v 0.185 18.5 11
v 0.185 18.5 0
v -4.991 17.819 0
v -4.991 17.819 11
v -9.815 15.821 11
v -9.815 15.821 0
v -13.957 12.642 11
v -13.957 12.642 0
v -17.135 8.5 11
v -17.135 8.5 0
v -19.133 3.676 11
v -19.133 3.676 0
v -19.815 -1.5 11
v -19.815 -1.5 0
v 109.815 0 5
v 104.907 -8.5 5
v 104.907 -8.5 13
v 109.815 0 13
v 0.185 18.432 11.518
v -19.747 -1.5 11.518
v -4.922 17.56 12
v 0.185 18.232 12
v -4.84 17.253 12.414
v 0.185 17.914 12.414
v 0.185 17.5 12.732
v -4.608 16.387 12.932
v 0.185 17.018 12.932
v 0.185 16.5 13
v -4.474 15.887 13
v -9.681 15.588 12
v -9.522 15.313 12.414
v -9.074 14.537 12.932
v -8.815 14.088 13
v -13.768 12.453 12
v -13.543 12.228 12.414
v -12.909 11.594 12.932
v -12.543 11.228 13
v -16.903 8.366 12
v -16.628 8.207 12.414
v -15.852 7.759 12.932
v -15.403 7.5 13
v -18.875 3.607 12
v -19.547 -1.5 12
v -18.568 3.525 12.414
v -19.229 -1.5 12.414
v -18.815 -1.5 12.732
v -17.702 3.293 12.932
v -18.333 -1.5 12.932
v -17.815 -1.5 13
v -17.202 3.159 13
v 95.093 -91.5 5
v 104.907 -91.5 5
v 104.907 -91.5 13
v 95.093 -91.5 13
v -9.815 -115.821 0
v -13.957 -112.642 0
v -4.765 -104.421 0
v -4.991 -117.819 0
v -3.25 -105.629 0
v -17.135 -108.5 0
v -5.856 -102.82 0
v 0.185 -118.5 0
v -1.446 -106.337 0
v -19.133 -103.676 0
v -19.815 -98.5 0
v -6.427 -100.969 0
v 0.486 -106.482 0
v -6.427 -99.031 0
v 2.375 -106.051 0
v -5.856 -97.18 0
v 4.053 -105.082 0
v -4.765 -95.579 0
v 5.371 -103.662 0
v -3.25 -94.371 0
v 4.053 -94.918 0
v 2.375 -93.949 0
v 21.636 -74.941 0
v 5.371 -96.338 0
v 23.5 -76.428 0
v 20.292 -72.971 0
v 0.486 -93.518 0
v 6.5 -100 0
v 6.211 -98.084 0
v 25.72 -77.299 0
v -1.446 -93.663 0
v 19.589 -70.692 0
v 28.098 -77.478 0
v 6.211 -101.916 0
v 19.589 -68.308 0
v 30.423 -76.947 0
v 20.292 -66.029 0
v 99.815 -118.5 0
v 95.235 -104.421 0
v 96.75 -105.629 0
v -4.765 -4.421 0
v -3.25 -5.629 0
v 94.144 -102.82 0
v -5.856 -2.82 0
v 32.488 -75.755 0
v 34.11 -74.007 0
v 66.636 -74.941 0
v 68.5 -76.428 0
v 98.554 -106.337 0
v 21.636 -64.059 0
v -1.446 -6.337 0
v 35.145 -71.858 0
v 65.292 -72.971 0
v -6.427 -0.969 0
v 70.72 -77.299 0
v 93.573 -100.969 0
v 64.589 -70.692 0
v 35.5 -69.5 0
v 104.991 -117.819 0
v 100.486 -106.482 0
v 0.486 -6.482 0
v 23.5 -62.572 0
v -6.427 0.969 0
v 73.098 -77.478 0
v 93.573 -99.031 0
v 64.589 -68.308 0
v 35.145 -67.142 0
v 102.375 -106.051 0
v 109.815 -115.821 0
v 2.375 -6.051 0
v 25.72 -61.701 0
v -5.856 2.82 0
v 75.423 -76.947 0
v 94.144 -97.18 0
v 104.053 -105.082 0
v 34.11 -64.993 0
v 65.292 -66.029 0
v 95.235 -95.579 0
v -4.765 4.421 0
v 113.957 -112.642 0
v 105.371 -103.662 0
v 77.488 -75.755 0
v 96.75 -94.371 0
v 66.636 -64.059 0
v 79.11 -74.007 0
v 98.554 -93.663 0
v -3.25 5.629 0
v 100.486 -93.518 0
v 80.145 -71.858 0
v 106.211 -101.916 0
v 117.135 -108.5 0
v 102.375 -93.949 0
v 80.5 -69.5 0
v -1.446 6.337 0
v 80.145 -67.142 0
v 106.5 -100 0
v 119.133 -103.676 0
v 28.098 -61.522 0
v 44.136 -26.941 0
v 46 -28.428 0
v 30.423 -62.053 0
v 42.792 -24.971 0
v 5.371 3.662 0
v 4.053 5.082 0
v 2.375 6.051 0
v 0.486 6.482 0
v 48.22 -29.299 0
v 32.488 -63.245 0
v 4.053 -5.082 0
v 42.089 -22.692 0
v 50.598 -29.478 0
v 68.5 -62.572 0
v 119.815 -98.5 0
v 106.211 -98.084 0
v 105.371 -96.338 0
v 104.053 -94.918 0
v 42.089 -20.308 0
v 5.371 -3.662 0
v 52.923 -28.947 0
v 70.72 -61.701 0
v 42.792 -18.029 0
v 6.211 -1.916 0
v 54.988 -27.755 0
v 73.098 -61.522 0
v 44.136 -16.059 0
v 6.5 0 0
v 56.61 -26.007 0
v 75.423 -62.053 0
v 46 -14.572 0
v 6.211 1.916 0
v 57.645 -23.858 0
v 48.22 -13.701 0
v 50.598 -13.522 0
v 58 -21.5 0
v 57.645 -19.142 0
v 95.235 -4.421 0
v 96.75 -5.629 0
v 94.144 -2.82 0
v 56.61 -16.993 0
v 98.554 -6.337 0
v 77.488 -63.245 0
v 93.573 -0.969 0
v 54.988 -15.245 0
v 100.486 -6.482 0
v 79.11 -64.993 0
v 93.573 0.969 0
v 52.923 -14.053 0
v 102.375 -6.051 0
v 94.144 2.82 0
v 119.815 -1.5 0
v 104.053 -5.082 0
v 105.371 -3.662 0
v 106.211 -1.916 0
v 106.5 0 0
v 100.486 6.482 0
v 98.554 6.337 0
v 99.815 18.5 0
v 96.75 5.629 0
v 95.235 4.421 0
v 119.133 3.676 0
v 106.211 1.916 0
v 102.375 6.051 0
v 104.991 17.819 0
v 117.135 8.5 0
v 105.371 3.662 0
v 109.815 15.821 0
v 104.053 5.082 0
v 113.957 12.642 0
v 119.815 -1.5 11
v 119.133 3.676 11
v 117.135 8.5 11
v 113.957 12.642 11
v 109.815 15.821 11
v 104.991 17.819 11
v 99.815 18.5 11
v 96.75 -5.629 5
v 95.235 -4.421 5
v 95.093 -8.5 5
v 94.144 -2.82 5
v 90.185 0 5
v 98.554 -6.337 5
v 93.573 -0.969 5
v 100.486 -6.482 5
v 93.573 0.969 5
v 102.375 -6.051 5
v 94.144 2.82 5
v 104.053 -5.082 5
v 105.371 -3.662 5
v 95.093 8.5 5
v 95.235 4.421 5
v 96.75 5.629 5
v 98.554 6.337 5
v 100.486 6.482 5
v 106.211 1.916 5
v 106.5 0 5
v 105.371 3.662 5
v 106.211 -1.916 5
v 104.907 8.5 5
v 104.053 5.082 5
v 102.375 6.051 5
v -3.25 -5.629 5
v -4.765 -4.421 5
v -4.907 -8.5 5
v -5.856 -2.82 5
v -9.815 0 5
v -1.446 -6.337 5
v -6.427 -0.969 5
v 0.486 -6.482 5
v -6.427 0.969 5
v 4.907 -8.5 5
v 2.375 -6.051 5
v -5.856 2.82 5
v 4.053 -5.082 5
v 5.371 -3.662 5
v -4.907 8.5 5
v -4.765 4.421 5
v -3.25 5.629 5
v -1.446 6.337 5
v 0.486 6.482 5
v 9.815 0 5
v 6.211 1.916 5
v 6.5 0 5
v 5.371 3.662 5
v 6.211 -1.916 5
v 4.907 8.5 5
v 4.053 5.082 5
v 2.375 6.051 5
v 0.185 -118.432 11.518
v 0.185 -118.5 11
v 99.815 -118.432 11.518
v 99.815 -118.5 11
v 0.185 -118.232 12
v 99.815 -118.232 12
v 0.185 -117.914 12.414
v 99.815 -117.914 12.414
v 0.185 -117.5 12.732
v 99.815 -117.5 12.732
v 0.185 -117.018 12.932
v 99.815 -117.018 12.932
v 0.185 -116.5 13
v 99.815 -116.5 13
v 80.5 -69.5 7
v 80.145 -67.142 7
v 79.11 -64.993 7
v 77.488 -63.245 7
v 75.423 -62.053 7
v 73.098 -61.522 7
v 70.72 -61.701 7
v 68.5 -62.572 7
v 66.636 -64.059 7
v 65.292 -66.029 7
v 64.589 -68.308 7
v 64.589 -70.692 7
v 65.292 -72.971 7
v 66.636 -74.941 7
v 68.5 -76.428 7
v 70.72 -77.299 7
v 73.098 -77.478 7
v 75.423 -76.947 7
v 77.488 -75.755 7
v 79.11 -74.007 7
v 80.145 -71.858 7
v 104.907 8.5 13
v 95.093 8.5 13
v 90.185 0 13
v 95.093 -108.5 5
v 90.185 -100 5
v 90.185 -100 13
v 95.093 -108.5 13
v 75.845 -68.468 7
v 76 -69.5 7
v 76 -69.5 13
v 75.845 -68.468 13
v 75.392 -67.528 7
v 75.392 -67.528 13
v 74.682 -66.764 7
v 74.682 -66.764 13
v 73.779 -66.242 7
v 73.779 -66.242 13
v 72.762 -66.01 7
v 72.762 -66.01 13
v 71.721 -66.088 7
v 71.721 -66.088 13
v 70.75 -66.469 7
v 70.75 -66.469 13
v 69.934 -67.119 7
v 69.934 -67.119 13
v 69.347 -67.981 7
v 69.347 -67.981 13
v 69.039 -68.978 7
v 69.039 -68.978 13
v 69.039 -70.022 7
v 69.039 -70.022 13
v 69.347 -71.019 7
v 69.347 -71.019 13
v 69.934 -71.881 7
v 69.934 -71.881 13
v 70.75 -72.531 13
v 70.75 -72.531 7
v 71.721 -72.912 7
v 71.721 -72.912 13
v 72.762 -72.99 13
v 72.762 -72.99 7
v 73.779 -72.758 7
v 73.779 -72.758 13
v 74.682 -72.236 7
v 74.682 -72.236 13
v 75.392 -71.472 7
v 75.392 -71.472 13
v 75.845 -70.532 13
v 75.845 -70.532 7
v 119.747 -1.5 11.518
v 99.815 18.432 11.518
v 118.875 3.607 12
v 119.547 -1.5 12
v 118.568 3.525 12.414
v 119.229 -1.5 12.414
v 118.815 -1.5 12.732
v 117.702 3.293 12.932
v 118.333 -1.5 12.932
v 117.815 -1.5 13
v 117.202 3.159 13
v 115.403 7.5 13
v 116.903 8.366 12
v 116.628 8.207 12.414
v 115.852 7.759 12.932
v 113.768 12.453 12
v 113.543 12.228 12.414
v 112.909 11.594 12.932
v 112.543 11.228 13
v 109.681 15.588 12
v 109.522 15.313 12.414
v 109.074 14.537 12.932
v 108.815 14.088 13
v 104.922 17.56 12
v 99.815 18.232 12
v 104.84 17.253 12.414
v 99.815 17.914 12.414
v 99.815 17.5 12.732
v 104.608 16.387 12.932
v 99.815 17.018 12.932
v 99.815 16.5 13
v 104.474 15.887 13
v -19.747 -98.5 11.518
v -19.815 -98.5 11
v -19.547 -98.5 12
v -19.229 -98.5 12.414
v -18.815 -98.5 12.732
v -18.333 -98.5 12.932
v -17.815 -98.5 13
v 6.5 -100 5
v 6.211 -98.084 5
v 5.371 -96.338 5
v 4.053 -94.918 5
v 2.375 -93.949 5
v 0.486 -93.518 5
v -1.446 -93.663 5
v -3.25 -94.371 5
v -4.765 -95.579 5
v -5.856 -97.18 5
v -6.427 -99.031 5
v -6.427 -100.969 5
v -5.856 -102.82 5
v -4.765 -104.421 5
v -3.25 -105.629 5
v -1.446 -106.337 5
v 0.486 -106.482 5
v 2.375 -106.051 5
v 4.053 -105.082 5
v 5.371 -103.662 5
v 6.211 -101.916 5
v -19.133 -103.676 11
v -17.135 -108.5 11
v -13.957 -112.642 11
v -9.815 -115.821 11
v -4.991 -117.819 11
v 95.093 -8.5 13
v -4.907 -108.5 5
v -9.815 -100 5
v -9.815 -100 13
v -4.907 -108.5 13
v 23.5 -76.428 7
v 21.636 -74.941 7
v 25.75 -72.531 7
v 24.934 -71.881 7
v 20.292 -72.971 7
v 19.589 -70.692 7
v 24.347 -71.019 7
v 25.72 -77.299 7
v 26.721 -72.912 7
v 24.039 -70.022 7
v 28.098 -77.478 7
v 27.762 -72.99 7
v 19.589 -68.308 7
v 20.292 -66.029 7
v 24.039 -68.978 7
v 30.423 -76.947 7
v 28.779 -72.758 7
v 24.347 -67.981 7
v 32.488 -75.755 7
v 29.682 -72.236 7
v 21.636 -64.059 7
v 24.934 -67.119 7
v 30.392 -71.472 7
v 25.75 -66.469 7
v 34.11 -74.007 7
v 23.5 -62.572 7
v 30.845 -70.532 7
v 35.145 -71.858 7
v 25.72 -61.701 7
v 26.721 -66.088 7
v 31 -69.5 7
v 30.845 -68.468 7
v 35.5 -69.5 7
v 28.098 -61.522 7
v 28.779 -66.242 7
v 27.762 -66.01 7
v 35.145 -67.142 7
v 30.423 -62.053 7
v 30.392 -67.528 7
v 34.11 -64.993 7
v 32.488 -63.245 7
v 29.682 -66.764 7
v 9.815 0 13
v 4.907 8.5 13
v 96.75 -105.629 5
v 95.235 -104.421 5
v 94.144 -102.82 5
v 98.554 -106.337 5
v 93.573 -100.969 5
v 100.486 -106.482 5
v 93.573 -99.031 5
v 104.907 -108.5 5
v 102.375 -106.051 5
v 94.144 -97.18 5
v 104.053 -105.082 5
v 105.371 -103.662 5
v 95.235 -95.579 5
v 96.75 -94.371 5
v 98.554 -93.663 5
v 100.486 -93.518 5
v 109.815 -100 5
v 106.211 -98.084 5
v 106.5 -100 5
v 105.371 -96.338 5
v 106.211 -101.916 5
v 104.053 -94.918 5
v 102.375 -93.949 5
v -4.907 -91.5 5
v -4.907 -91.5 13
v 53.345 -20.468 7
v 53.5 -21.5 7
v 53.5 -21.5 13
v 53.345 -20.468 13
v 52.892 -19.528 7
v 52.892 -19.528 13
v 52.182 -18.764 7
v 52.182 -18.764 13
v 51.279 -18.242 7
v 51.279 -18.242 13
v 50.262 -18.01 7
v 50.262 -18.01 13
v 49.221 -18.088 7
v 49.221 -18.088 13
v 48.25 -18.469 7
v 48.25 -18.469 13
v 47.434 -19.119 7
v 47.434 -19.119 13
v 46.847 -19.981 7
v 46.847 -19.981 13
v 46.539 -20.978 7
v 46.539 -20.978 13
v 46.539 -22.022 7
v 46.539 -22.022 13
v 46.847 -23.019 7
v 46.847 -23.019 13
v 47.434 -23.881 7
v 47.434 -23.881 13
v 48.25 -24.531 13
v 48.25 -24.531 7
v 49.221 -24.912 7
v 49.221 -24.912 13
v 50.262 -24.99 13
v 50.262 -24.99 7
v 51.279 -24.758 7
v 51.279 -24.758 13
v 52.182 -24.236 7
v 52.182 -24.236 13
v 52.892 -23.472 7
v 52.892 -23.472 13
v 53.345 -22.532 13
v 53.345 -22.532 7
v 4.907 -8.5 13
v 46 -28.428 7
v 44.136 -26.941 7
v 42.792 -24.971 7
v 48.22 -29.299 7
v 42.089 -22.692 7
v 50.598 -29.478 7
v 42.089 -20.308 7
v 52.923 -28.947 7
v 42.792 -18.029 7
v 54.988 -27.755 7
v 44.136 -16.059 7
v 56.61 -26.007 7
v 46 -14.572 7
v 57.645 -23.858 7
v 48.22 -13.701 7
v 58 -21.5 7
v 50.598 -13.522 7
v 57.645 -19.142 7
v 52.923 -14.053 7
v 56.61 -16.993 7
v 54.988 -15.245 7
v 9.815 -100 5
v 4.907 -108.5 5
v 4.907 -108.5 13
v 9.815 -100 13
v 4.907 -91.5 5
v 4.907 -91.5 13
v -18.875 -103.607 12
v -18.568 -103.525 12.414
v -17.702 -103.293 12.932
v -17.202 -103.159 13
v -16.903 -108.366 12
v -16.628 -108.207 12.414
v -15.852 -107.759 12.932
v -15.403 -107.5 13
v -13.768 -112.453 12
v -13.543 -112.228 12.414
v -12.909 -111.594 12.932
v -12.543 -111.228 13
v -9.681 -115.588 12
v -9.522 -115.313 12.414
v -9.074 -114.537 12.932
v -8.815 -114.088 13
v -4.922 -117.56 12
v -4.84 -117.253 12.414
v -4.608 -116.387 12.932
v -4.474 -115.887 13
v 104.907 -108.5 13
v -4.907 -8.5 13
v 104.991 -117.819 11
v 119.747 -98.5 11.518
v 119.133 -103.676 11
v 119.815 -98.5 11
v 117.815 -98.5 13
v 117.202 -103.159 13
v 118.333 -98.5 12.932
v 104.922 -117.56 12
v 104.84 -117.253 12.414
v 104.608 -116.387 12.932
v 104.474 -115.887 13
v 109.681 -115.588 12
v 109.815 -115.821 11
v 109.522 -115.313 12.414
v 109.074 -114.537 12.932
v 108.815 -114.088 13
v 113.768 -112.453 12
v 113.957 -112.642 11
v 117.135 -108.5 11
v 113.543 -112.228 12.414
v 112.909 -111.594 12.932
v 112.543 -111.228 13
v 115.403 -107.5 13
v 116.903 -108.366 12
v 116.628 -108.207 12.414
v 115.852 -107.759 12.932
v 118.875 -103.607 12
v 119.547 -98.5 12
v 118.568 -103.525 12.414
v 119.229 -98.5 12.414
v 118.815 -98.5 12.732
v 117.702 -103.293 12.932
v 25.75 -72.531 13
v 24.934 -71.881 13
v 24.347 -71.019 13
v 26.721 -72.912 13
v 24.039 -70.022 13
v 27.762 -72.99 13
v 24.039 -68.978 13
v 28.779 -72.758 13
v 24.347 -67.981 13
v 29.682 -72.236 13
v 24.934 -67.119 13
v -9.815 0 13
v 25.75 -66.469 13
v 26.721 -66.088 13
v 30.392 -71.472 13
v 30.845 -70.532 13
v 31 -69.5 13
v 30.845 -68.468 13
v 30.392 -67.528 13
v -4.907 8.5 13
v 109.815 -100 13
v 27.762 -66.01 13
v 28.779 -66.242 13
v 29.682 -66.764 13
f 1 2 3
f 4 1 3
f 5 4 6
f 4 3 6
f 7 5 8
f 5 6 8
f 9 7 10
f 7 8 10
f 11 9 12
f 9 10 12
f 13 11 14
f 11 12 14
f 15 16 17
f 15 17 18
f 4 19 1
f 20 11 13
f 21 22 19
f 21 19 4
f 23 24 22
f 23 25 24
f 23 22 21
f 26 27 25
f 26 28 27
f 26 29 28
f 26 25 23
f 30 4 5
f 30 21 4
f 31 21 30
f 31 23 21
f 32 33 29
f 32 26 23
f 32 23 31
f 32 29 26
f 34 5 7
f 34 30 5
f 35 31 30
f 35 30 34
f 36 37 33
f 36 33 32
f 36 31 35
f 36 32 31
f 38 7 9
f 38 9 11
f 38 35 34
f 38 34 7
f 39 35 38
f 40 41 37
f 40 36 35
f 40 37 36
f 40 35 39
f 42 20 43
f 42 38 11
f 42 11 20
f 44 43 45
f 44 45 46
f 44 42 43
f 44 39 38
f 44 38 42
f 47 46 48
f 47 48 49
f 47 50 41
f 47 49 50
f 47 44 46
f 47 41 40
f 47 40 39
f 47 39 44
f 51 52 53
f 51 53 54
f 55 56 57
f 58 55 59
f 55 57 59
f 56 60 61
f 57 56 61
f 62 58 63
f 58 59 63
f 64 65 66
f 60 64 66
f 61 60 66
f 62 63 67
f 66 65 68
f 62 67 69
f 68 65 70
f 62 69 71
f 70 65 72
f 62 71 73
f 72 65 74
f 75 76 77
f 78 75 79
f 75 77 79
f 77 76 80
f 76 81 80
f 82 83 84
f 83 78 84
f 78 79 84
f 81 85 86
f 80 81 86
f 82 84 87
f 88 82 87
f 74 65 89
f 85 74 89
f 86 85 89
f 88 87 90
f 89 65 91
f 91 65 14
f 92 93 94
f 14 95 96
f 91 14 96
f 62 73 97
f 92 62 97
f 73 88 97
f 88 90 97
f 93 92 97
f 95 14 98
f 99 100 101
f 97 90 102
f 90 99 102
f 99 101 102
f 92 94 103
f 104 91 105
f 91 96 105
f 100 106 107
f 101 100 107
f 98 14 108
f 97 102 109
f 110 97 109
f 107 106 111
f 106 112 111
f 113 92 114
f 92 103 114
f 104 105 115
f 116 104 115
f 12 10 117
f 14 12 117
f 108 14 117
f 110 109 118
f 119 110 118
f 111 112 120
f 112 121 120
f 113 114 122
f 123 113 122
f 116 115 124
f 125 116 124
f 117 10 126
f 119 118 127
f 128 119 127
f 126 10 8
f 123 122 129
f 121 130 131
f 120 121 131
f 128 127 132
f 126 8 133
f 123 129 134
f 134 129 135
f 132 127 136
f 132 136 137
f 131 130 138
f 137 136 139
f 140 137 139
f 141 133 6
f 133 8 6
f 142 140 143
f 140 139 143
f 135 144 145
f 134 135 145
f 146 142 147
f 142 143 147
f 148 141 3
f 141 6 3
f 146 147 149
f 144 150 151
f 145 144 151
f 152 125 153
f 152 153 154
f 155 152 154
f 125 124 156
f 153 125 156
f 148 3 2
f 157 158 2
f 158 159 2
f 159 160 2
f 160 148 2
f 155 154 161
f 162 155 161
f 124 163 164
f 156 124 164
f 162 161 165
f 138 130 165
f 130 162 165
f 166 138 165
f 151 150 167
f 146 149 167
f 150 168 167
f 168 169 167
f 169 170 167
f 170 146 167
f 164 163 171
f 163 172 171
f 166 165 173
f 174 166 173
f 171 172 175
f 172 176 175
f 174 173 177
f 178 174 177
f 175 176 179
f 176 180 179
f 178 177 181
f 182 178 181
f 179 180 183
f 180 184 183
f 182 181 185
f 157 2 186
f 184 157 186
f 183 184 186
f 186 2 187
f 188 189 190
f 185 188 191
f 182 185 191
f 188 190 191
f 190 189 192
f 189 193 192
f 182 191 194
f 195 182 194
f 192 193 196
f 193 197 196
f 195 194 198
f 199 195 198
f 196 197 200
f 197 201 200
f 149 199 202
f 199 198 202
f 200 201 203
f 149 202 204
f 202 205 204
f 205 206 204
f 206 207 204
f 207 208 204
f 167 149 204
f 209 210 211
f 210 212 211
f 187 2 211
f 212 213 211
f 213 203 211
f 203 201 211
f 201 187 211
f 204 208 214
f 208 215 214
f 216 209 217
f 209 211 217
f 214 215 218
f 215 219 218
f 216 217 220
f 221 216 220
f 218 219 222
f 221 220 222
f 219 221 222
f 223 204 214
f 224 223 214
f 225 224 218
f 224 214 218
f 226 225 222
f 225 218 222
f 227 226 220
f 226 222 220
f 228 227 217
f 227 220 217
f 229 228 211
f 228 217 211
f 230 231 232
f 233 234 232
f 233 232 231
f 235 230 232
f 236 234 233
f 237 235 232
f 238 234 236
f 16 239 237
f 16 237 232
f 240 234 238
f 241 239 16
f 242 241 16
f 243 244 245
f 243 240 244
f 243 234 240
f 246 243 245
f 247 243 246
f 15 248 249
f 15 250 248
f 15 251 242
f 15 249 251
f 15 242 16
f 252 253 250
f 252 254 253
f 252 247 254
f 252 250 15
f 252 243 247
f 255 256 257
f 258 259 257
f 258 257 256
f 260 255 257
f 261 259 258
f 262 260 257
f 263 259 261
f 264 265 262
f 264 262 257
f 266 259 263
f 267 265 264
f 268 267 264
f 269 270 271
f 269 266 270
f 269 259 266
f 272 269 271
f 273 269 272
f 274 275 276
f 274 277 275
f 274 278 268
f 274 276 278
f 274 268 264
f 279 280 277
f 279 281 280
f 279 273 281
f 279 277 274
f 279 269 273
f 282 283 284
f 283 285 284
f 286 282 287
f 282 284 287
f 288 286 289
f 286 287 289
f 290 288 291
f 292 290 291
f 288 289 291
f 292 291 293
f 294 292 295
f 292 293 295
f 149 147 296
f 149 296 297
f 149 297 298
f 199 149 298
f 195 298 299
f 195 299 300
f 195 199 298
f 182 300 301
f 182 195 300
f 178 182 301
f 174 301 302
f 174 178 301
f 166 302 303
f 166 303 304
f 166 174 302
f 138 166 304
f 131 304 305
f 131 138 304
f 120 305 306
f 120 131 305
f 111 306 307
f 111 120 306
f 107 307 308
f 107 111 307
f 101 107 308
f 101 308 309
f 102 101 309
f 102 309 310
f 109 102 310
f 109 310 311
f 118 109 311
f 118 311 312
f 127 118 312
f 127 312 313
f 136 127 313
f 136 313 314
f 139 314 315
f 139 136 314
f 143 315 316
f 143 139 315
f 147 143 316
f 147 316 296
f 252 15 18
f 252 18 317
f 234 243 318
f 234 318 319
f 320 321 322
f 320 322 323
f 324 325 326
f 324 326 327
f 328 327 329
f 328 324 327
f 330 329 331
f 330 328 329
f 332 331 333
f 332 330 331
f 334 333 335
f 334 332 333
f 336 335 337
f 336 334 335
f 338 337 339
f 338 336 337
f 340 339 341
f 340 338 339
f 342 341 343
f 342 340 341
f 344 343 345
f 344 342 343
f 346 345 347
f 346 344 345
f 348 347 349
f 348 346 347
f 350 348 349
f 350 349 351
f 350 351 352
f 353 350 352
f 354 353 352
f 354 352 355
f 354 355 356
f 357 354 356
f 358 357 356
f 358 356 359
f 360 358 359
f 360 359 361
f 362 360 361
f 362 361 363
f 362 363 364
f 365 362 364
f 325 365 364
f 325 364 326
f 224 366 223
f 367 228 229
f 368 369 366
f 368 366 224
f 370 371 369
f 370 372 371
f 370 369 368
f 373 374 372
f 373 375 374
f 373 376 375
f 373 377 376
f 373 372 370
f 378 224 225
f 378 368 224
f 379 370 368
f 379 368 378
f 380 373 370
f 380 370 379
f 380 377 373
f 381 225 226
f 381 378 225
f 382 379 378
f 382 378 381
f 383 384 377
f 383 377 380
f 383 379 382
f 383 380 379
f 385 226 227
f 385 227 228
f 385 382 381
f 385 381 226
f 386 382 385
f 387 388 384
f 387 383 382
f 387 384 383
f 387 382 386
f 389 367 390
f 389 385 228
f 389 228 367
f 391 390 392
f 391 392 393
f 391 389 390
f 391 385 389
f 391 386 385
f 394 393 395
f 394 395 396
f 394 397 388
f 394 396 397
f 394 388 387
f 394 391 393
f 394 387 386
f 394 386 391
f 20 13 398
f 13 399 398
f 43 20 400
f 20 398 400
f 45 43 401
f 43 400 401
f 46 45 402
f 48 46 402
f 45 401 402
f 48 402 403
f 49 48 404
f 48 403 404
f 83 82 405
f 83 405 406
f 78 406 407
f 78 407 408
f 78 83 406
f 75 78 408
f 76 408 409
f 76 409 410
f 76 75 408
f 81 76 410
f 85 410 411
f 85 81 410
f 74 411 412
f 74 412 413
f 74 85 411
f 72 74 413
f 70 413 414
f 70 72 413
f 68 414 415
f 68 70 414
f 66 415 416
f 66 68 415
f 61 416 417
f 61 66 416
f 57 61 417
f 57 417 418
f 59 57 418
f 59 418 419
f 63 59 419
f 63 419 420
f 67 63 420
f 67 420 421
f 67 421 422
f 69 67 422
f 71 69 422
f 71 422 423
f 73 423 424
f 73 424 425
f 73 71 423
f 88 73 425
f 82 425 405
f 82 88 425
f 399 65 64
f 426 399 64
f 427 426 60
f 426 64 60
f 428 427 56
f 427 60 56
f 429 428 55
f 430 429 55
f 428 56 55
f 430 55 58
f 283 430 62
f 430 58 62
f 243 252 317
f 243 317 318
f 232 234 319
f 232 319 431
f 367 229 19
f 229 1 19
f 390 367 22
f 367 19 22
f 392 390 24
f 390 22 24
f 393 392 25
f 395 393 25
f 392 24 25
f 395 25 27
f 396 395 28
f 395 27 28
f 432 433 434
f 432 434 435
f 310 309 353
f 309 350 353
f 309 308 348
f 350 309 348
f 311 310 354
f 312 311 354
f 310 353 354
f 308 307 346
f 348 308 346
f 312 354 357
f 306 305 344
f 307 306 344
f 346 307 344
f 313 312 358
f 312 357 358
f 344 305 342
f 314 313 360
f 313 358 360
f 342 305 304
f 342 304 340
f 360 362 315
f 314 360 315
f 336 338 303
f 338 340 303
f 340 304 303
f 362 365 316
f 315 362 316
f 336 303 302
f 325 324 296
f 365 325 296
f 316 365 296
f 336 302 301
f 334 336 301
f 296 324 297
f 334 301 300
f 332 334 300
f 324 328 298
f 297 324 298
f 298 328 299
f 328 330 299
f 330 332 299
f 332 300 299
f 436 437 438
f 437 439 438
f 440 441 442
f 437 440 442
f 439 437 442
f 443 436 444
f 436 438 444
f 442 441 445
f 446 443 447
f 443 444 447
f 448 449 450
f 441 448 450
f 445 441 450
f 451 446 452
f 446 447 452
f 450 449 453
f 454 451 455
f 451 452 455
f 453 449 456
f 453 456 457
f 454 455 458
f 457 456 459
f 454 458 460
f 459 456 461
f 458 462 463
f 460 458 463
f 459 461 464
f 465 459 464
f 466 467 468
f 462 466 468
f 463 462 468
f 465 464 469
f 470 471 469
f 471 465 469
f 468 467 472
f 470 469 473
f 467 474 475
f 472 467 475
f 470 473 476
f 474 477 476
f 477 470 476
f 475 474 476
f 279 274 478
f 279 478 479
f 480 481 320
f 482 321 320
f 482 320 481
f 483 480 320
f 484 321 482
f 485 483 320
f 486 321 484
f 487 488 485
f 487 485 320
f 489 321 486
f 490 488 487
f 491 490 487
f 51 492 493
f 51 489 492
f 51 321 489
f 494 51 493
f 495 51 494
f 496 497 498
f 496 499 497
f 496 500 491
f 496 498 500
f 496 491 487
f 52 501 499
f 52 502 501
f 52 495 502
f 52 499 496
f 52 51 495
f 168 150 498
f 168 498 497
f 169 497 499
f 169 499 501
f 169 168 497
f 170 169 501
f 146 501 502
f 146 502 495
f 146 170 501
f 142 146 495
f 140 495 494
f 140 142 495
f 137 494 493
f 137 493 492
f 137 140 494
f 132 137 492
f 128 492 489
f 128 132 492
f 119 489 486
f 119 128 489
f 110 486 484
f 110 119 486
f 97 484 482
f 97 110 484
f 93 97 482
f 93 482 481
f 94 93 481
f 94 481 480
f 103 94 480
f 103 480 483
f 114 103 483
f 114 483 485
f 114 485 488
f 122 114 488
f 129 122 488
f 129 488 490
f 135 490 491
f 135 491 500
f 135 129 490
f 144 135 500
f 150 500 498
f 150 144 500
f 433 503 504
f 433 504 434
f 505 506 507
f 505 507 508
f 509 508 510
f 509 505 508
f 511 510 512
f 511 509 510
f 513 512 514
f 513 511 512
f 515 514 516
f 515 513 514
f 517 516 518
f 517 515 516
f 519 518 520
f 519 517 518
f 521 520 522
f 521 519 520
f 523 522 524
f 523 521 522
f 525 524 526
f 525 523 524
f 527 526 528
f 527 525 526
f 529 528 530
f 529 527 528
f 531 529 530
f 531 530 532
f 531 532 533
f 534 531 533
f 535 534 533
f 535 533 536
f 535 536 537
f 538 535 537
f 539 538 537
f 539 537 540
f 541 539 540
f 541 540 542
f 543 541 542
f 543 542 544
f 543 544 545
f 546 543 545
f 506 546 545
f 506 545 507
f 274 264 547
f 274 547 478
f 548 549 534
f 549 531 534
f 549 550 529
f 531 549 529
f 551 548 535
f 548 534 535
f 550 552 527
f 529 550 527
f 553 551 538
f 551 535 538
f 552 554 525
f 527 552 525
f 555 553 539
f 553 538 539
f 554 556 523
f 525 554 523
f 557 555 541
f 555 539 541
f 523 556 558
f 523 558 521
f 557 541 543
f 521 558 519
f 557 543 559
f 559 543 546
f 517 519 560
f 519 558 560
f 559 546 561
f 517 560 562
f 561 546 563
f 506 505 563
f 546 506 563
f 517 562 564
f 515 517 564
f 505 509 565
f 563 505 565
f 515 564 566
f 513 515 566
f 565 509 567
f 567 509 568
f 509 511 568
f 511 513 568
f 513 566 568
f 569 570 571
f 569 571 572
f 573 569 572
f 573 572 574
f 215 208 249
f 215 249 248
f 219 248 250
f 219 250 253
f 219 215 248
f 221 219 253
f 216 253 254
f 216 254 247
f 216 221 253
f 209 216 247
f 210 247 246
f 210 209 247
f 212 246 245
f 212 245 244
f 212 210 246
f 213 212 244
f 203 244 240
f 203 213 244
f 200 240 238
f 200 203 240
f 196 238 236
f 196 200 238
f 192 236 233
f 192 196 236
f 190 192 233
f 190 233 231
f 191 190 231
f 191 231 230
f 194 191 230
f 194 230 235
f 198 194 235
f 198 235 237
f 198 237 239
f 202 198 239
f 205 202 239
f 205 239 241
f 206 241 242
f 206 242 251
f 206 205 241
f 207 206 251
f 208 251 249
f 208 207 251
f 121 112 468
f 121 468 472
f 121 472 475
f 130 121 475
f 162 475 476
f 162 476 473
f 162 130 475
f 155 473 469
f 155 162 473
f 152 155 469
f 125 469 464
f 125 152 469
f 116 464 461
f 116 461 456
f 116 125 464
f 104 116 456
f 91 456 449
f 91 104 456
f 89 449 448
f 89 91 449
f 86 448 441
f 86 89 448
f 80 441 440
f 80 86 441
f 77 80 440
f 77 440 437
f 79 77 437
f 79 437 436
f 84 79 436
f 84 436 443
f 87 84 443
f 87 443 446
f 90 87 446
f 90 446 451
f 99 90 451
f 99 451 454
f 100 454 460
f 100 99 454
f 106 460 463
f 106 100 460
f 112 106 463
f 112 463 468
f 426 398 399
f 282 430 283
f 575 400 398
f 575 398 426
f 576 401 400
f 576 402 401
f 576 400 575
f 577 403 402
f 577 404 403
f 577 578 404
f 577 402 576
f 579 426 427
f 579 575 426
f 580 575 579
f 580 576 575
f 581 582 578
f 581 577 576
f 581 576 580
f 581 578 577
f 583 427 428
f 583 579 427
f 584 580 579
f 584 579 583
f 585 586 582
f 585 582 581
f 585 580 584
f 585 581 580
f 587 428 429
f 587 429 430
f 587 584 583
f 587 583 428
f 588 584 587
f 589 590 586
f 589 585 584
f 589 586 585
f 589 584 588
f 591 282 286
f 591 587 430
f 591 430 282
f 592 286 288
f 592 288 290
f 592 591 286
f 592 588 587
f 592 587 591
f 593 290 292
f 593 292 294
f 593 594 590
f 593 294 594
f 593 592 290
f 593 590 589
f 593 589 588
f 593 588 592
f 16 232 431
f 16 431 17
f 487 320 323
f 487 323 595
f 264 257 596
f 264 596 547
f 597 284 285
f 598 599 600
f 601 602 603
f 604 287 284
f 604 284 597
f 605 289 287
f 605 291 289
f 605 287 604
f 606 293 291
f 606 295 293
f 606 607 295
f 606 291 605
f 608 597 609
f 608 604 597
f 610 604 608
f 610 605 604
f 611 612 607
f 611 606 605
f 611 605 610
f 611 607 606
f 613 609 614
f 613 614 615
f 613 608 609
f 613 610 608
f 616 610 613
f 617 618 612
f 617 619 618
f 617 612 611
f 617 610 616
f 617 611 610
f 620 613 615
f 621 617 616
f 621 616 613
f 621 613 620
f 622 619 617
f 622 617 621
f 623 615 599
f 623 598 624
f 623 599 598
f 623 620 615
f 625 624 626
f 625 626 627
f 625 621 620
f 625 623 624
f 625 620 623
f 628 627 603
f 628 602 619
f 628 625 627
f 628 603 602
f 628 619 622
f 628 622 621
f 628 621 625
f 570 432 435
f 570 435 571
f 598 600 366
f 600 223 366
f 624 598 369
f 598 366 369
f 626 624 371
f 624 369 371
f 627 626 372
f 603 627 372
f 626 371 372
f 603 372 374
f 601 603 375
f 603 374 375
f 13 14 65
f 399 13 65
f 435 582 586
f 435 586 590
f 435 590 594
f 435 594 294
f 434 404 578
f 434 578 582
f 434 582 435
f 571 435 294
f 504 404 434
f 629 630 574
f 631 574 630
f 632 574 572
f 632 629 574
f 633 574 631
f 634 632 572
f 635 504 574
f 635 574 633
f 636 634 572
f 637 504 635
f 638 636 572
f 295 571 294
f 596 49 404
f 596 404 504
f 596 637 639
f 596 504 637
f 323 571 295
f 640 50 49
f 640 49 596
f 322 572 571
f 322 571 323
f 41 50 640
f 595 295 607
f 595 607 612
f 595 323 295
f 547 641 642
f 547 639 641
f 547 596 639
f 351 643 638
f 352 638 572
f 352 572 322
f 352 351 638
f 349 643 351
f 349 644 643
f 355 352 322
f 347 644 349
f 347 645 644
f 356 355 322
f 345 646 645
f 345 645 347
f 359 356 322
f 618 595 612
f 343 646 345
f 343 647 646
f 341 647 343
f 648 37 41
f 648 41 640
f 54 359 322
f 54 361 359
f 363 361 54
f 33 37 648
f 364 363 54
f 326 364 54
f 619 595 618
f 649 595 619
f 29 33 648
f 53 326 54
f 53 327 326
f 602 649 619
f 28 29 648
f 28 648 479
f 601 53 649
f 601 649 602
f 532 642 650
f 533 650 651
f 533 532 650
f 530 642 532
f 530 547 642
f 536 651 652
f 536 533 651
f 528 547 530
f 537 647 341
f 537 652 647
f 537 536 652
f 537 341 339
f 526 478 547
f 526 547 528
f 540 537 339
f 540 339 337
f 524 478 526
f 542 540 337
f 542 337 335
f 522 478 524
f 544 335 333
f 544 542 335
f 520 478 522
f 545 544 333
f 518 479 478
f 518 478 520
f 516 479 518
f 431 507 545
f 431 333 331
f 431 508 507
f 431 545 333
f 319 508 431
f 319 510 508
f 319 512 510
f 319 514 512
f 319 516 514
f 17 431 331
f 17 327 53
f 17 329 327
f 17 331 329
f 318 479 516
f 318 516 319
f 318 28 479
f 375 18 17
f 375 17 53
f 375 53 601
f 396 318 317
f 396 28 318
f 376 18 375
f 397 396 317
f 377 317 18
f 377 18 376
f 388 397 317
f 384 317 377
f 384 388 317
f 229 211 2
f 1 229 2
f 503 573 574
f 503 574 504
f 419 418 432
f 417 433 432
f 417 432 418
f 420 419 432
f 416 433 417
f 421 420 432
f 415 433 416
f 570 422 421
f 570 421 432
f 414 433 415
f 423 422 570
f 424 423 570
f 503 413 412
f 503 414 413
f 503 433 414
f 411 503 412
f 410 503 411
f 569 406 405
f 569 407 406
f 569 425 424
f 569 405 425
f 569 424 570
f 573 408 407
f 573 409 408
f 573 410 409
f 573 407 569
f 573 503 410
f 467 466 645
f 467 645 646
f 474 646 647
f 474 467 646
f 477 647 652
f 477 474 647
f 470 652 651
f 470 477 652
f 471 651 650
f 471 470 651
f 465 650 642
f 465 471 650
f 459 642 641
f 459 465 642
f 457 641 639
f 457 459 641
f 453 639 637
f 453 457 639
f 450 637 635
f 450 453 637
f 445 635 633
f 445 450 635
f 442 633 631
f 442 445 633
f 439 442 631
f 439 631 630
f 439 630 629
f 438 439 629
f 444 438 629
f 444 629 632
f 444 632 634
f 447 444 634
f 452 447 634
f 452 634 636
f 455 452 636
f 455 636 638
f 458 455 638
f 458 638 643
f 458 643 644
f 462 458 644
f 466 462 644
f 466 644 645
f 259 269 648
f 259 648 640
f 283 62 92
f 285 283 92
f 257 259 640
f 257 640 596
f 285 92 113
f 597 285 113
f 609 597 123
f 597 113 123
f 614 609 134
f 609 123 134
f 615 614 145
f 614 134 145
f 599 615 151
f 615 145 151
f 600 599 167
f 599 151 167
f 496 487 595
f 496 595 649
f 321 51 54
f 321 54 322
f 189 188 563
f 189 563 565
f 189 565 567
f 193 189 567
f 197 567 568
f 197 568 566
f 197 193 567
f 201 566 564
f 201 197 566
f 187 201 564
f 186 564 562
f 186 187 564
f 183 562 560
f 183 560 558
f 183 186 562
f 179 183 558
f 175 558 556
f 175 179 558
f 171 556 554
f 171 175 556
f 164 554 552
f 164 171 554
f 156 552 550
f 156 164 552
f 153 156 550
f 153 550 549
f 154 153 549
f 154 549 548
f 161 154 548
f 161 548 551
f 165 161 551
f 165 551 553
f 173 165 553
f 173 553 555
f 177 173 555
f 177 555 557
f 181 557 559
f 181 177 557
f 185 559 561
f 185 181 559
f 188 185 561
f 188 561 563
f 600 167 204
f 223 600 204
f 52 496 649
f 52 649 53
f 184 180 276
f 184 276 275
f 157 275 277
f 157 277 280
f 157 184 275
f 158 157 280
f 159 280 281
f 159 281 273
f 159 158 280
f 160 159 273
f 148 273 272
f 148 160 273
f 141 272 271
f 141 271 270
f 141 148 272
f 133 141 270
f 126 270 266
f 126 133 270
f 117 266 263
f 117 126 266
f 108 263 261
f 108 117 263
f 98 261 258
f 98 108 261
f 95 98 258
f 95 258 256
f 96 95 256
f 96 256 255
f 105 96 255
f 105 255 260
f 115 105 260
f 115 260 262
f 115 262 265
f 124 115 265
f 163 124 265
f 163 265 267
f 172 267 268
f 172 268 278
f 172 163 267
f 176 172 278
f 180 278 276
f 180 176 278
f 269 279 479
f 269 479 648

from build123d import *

# Parameters (mm, degrees)
F0_R     = 8
F0_R_2   = 6.5
F0_R_3   = 3.5
F1_DEPTH = 13
F2_DEPTH = 13
F3_DEPTH = 7
F4_DEPTH = 13
F5_DEPTH = 5
F6_DEPTH = 5
F7_R     = 2


with BuildPart() as f1:
    # F0 (on Top) → F1 (new body)
    with BuildSketch(Plane.XY):
        with BuildLine():
            Line((99.814955, 18.5), (0.185045, 18.5))
            ThreePointArc((0.185045, 18.5), (-13.95709, 12.642136), (-19.814955, -1.5))
            Line((-19.814955, -1.5), (-19.814955, -98.5))
            ThreePointArc((-19.814955, -98.5), (-13.95709, -112.642136), (0.185045, -118.5))
            Line((0.185045, -118.5), (99.814955, -118.5))
            ThreePointArc((99.814955, -118.5), (113.95709, -112.642136), (119.814955, -98.5))
            Line((119.814955, -98.5), (119.814955, -1.5))
            ThreePointArc((119.814955, -1.5), (113.95709, 12.642136), (99.814955, 18.5))
        make_face()
        Polygon((9.814955, -100), (4.907477, -108.5), (-4.907477, -108.5), (-9.814955, -100), (-4.907477, -91.5), (4.907477, -91.5), align=None, mode=Mode.SUBTRACT)
        with Locations((27.5, -69.5)):
            Circle(F0_R, mode=Mode.SUBTRACT)
        Polygon((109.814955, -100), (104.907477, -108.5), (95.092523, -108.5), (90.185045, -100), (95.092523, -91.5), (104.907477, -91.5), align=None, mode=Mode.SUBTRACT)
        with Locations((72.5, -69.5)):
            Circle(F0_R, mode=Mode.SUBTRACT)
        with Locations((50, -21.5)):
            Circle(F0_R, mode=Mode.SUBTRACT)
        Polygon((9.814955, 0), (4.907477, -8.5), (-4.907477, -8.5), (-9.814955, 0), (-4.907477, 8.5), (4.907477, 8.5), align=None, mode=Mode.SUBTRACT)
        Polygon((109.814955, 0), (104.907477, -8.5), (95.092523, -8.5), (90.185045, 0), (95.092523, 8.5), (104.907477, 8.5), align=None, mode=Mode.SUBTRACT)
        Polygon((-4.907477, -8.5), (4.907477, -8.5), (9.814955, 0), (4.907477, 8.5), (-4.907477, 8.5), (-9.814955, 0), align=None)
        Circle(F0_R_2, mode=Mode.SUBTRACT)
        with Locations((50, -21.5)):
            Circle(F0_R)
        with Locations((50, -21.5)):
            Circle(F0_R_3, mode=Mode.SUBTRACT)
        with Locations((50, -21.5)):
            Circle(F0_R_3)
        Polygon((95.092523, -8.5), (104.907477, -8.5), (109.814955, 0), (104.907477, 8.5), (95.092523, 8.5), (90.185045, 0), align=None)
        with Locations((100, 0)):
            Circle(F0_R_2, mode=Mode.SUBTRACT)
        with Locations((72.5, -69.5)):
            Circle(F0_R)
        with Locations((72.5, -69.5)):
            Circle(F0_R_3, mode=Mode.SUBTRACT)
        with Locations((72.5, -69.5)):
            Circle(F0_R_3)
        with Locations((27.5, -69.5)):
            Circle(F0_R)
        with Locations((27.5, -69.5)):
            Circle(F0_R_3, mode=Mode.SUBTRACT)
        with Locations((27.5, -69.5)):
            Circle(F0_R_3)
        Polygon((-4.907477, -108.5), (4.907477, -108.5), (9.814955, -100), (4.907477, -91.5), (-4.907477, -91.5), (-9.814955, -100), align=None)
        with Locations((0, -100)):
            Circle(F0_R_2, mode=Mode.SUBTRACT)
        Polygon((95.092523, -108.5), (104.907477, -108.5), (109.814955, -100), (104.907477, -91.5), (95.092523, -91.5), (90.185045, -100), align=None)
        with Locations((100, -100)):
            Circle(F0_R_2, mode=Mode.SUBTRACT)
    extrude(amount=F1_DEPTH)

    # F0 (on Top) → F2 (cut, through all)
    with BuildSketch(Plane.XY):
        Polygon((-4.907477, -8.5), (4.907477, -8.5), (9.814955, 0), (4.907477, 8.5), (-4.907477, 8.5), (-9.814955, 0), align=None)
        Circle(F0_R_2, mode=Mode.SUBTRACT)
        Polygon((95.092523, -108.5), (104.907477, -108.5), (109.814955, -100), (104.907477, -91.5), (95.092523, -91.5), (90.185045, -100), align=None)
        with Locations((100, -100)):
            Circle(F0_R_2, mode=Mode.SUBTRACT)
        Polygon((-4.907477, -108.5), (4.907477, -108.5), (9.814955, -100), (4.907477, -91.5), (-4.907477, -91.5), (-9.814955, -100), align=None)
        with Locations((0, -100)):
            Circle(F0_R_2, mode=Mode.SUBTRACT)
        Polygon((95.092523, -8.5), (104.907477, -8.5), (109.814955, 0), (104.907477, 8.5), (95.092523, 8.5), (90.185045, 0), align=None)
        with Locations((100, 0)):
            Circle(F0_R_2, mode=Mode.SUBTRACT)
    extrude(amount=F2_DEPTH, mode=Mode.SUBTRACT)

    # F0 (on Top) → F3 (cut)
    with BuildSketch(Plane.XY):
        with Locations((72.5, -69.5)):
            Circle(F0_R)
        with Locations((72.5, -69.5)):
            Circle(F0_R_3, mode=Mode.SUBTRACT)
        with Locations((27.5, -69.5)):
            Circle(F0_R)
        with Locations((27.5, -69.5)):
            Circle(F0_R_3, mode=Mode.SUBTRACT)
        with Locations((50, -21.5)):
            Circle(F0_R)
        with Locations((50, -21.5)):
            Circle(F0_R_3, mode=Mode.SUBTRACT)
    extrude(amount=F3_DEPTH, mode=Mode.SUBTRACT)

    # F0 (on Top) → F4 (cut, through all)
    with BuildSketch(Plane.XY):
        with Locations((27.5, -69.5)):
            Circle(F0_R_3)
        with Locations((72.5, -69.5)):
            Circle(F0_R_3)
        with Locations((50, -21.5)):
            Circle(F0_R_3)
    extrude(amount=F4_DEPTH, mode=Mode.SUBTRACT)

    # F0 (on Top) → F5 (join)
    with BuildSketch(Plane.XY):
        Polygon((-4.907477, -8.5), (4.907477, -8.5), (9.814955, 0), (4.907477, 8.5), (-4.907477, 8.5), (-9.814955, 0), align=None)
        Circle(F0_R_2, mode=Mode.SUBTRACT)
        Polygon((95.092523, -8.5), (104.907477, -8.5), (109.814955, 0), (104.907477, 8.5), (95.092523, 8.5), (90.185045, 0), align=None)
        with Locations((100, 0)):
            Circle(F0_R_2, mode=Mode.SUBTRACT)
        Polygon((95.092523, -108.5), (104.907477, -108.5), (109.814955, -100), (104.907477, -91.5), (95.092523, -91.5), (90.185045, -100), align=None)
        with Locations((100, -100)):
            Circle(F0_R_2, mode=Mode.SUBTRACT)
        Polygon((-4.907477, -108.5), (4.907477, -108.5), (9.814955, -100), (4.907477, -91.5), (-4.907477, -91.5), (-9.814955, -100), align=None)
        with Locations((0, -100)):
            Circle(F0_R_2, mode=Mode.SUBTRACT)
    extrude(amount=F5_DEPTH)

    # F0 (on Top) → F6 (cut, through all)
    with BuildSketch(Plane.XY):
        Circle(F0_R_2)
        with Locations((100, 0)):
            Circle(F0_R_2)
        with Locations((100, -100)):
            Circle(F0_R_2)
        with Locations((0, -100)):
            Circle(F0_R_2)
    extrude(amount=F6_DEPTH, mode=Mode.SUBTRACT)

    # F7
    f7_edges = [f1.edges().sort_by_distance(p)[0] for p in [
        (119.814955, -50, 13),
    ]]
    fillet(f7_edges, radius=F7_R)


solid = f1.part
